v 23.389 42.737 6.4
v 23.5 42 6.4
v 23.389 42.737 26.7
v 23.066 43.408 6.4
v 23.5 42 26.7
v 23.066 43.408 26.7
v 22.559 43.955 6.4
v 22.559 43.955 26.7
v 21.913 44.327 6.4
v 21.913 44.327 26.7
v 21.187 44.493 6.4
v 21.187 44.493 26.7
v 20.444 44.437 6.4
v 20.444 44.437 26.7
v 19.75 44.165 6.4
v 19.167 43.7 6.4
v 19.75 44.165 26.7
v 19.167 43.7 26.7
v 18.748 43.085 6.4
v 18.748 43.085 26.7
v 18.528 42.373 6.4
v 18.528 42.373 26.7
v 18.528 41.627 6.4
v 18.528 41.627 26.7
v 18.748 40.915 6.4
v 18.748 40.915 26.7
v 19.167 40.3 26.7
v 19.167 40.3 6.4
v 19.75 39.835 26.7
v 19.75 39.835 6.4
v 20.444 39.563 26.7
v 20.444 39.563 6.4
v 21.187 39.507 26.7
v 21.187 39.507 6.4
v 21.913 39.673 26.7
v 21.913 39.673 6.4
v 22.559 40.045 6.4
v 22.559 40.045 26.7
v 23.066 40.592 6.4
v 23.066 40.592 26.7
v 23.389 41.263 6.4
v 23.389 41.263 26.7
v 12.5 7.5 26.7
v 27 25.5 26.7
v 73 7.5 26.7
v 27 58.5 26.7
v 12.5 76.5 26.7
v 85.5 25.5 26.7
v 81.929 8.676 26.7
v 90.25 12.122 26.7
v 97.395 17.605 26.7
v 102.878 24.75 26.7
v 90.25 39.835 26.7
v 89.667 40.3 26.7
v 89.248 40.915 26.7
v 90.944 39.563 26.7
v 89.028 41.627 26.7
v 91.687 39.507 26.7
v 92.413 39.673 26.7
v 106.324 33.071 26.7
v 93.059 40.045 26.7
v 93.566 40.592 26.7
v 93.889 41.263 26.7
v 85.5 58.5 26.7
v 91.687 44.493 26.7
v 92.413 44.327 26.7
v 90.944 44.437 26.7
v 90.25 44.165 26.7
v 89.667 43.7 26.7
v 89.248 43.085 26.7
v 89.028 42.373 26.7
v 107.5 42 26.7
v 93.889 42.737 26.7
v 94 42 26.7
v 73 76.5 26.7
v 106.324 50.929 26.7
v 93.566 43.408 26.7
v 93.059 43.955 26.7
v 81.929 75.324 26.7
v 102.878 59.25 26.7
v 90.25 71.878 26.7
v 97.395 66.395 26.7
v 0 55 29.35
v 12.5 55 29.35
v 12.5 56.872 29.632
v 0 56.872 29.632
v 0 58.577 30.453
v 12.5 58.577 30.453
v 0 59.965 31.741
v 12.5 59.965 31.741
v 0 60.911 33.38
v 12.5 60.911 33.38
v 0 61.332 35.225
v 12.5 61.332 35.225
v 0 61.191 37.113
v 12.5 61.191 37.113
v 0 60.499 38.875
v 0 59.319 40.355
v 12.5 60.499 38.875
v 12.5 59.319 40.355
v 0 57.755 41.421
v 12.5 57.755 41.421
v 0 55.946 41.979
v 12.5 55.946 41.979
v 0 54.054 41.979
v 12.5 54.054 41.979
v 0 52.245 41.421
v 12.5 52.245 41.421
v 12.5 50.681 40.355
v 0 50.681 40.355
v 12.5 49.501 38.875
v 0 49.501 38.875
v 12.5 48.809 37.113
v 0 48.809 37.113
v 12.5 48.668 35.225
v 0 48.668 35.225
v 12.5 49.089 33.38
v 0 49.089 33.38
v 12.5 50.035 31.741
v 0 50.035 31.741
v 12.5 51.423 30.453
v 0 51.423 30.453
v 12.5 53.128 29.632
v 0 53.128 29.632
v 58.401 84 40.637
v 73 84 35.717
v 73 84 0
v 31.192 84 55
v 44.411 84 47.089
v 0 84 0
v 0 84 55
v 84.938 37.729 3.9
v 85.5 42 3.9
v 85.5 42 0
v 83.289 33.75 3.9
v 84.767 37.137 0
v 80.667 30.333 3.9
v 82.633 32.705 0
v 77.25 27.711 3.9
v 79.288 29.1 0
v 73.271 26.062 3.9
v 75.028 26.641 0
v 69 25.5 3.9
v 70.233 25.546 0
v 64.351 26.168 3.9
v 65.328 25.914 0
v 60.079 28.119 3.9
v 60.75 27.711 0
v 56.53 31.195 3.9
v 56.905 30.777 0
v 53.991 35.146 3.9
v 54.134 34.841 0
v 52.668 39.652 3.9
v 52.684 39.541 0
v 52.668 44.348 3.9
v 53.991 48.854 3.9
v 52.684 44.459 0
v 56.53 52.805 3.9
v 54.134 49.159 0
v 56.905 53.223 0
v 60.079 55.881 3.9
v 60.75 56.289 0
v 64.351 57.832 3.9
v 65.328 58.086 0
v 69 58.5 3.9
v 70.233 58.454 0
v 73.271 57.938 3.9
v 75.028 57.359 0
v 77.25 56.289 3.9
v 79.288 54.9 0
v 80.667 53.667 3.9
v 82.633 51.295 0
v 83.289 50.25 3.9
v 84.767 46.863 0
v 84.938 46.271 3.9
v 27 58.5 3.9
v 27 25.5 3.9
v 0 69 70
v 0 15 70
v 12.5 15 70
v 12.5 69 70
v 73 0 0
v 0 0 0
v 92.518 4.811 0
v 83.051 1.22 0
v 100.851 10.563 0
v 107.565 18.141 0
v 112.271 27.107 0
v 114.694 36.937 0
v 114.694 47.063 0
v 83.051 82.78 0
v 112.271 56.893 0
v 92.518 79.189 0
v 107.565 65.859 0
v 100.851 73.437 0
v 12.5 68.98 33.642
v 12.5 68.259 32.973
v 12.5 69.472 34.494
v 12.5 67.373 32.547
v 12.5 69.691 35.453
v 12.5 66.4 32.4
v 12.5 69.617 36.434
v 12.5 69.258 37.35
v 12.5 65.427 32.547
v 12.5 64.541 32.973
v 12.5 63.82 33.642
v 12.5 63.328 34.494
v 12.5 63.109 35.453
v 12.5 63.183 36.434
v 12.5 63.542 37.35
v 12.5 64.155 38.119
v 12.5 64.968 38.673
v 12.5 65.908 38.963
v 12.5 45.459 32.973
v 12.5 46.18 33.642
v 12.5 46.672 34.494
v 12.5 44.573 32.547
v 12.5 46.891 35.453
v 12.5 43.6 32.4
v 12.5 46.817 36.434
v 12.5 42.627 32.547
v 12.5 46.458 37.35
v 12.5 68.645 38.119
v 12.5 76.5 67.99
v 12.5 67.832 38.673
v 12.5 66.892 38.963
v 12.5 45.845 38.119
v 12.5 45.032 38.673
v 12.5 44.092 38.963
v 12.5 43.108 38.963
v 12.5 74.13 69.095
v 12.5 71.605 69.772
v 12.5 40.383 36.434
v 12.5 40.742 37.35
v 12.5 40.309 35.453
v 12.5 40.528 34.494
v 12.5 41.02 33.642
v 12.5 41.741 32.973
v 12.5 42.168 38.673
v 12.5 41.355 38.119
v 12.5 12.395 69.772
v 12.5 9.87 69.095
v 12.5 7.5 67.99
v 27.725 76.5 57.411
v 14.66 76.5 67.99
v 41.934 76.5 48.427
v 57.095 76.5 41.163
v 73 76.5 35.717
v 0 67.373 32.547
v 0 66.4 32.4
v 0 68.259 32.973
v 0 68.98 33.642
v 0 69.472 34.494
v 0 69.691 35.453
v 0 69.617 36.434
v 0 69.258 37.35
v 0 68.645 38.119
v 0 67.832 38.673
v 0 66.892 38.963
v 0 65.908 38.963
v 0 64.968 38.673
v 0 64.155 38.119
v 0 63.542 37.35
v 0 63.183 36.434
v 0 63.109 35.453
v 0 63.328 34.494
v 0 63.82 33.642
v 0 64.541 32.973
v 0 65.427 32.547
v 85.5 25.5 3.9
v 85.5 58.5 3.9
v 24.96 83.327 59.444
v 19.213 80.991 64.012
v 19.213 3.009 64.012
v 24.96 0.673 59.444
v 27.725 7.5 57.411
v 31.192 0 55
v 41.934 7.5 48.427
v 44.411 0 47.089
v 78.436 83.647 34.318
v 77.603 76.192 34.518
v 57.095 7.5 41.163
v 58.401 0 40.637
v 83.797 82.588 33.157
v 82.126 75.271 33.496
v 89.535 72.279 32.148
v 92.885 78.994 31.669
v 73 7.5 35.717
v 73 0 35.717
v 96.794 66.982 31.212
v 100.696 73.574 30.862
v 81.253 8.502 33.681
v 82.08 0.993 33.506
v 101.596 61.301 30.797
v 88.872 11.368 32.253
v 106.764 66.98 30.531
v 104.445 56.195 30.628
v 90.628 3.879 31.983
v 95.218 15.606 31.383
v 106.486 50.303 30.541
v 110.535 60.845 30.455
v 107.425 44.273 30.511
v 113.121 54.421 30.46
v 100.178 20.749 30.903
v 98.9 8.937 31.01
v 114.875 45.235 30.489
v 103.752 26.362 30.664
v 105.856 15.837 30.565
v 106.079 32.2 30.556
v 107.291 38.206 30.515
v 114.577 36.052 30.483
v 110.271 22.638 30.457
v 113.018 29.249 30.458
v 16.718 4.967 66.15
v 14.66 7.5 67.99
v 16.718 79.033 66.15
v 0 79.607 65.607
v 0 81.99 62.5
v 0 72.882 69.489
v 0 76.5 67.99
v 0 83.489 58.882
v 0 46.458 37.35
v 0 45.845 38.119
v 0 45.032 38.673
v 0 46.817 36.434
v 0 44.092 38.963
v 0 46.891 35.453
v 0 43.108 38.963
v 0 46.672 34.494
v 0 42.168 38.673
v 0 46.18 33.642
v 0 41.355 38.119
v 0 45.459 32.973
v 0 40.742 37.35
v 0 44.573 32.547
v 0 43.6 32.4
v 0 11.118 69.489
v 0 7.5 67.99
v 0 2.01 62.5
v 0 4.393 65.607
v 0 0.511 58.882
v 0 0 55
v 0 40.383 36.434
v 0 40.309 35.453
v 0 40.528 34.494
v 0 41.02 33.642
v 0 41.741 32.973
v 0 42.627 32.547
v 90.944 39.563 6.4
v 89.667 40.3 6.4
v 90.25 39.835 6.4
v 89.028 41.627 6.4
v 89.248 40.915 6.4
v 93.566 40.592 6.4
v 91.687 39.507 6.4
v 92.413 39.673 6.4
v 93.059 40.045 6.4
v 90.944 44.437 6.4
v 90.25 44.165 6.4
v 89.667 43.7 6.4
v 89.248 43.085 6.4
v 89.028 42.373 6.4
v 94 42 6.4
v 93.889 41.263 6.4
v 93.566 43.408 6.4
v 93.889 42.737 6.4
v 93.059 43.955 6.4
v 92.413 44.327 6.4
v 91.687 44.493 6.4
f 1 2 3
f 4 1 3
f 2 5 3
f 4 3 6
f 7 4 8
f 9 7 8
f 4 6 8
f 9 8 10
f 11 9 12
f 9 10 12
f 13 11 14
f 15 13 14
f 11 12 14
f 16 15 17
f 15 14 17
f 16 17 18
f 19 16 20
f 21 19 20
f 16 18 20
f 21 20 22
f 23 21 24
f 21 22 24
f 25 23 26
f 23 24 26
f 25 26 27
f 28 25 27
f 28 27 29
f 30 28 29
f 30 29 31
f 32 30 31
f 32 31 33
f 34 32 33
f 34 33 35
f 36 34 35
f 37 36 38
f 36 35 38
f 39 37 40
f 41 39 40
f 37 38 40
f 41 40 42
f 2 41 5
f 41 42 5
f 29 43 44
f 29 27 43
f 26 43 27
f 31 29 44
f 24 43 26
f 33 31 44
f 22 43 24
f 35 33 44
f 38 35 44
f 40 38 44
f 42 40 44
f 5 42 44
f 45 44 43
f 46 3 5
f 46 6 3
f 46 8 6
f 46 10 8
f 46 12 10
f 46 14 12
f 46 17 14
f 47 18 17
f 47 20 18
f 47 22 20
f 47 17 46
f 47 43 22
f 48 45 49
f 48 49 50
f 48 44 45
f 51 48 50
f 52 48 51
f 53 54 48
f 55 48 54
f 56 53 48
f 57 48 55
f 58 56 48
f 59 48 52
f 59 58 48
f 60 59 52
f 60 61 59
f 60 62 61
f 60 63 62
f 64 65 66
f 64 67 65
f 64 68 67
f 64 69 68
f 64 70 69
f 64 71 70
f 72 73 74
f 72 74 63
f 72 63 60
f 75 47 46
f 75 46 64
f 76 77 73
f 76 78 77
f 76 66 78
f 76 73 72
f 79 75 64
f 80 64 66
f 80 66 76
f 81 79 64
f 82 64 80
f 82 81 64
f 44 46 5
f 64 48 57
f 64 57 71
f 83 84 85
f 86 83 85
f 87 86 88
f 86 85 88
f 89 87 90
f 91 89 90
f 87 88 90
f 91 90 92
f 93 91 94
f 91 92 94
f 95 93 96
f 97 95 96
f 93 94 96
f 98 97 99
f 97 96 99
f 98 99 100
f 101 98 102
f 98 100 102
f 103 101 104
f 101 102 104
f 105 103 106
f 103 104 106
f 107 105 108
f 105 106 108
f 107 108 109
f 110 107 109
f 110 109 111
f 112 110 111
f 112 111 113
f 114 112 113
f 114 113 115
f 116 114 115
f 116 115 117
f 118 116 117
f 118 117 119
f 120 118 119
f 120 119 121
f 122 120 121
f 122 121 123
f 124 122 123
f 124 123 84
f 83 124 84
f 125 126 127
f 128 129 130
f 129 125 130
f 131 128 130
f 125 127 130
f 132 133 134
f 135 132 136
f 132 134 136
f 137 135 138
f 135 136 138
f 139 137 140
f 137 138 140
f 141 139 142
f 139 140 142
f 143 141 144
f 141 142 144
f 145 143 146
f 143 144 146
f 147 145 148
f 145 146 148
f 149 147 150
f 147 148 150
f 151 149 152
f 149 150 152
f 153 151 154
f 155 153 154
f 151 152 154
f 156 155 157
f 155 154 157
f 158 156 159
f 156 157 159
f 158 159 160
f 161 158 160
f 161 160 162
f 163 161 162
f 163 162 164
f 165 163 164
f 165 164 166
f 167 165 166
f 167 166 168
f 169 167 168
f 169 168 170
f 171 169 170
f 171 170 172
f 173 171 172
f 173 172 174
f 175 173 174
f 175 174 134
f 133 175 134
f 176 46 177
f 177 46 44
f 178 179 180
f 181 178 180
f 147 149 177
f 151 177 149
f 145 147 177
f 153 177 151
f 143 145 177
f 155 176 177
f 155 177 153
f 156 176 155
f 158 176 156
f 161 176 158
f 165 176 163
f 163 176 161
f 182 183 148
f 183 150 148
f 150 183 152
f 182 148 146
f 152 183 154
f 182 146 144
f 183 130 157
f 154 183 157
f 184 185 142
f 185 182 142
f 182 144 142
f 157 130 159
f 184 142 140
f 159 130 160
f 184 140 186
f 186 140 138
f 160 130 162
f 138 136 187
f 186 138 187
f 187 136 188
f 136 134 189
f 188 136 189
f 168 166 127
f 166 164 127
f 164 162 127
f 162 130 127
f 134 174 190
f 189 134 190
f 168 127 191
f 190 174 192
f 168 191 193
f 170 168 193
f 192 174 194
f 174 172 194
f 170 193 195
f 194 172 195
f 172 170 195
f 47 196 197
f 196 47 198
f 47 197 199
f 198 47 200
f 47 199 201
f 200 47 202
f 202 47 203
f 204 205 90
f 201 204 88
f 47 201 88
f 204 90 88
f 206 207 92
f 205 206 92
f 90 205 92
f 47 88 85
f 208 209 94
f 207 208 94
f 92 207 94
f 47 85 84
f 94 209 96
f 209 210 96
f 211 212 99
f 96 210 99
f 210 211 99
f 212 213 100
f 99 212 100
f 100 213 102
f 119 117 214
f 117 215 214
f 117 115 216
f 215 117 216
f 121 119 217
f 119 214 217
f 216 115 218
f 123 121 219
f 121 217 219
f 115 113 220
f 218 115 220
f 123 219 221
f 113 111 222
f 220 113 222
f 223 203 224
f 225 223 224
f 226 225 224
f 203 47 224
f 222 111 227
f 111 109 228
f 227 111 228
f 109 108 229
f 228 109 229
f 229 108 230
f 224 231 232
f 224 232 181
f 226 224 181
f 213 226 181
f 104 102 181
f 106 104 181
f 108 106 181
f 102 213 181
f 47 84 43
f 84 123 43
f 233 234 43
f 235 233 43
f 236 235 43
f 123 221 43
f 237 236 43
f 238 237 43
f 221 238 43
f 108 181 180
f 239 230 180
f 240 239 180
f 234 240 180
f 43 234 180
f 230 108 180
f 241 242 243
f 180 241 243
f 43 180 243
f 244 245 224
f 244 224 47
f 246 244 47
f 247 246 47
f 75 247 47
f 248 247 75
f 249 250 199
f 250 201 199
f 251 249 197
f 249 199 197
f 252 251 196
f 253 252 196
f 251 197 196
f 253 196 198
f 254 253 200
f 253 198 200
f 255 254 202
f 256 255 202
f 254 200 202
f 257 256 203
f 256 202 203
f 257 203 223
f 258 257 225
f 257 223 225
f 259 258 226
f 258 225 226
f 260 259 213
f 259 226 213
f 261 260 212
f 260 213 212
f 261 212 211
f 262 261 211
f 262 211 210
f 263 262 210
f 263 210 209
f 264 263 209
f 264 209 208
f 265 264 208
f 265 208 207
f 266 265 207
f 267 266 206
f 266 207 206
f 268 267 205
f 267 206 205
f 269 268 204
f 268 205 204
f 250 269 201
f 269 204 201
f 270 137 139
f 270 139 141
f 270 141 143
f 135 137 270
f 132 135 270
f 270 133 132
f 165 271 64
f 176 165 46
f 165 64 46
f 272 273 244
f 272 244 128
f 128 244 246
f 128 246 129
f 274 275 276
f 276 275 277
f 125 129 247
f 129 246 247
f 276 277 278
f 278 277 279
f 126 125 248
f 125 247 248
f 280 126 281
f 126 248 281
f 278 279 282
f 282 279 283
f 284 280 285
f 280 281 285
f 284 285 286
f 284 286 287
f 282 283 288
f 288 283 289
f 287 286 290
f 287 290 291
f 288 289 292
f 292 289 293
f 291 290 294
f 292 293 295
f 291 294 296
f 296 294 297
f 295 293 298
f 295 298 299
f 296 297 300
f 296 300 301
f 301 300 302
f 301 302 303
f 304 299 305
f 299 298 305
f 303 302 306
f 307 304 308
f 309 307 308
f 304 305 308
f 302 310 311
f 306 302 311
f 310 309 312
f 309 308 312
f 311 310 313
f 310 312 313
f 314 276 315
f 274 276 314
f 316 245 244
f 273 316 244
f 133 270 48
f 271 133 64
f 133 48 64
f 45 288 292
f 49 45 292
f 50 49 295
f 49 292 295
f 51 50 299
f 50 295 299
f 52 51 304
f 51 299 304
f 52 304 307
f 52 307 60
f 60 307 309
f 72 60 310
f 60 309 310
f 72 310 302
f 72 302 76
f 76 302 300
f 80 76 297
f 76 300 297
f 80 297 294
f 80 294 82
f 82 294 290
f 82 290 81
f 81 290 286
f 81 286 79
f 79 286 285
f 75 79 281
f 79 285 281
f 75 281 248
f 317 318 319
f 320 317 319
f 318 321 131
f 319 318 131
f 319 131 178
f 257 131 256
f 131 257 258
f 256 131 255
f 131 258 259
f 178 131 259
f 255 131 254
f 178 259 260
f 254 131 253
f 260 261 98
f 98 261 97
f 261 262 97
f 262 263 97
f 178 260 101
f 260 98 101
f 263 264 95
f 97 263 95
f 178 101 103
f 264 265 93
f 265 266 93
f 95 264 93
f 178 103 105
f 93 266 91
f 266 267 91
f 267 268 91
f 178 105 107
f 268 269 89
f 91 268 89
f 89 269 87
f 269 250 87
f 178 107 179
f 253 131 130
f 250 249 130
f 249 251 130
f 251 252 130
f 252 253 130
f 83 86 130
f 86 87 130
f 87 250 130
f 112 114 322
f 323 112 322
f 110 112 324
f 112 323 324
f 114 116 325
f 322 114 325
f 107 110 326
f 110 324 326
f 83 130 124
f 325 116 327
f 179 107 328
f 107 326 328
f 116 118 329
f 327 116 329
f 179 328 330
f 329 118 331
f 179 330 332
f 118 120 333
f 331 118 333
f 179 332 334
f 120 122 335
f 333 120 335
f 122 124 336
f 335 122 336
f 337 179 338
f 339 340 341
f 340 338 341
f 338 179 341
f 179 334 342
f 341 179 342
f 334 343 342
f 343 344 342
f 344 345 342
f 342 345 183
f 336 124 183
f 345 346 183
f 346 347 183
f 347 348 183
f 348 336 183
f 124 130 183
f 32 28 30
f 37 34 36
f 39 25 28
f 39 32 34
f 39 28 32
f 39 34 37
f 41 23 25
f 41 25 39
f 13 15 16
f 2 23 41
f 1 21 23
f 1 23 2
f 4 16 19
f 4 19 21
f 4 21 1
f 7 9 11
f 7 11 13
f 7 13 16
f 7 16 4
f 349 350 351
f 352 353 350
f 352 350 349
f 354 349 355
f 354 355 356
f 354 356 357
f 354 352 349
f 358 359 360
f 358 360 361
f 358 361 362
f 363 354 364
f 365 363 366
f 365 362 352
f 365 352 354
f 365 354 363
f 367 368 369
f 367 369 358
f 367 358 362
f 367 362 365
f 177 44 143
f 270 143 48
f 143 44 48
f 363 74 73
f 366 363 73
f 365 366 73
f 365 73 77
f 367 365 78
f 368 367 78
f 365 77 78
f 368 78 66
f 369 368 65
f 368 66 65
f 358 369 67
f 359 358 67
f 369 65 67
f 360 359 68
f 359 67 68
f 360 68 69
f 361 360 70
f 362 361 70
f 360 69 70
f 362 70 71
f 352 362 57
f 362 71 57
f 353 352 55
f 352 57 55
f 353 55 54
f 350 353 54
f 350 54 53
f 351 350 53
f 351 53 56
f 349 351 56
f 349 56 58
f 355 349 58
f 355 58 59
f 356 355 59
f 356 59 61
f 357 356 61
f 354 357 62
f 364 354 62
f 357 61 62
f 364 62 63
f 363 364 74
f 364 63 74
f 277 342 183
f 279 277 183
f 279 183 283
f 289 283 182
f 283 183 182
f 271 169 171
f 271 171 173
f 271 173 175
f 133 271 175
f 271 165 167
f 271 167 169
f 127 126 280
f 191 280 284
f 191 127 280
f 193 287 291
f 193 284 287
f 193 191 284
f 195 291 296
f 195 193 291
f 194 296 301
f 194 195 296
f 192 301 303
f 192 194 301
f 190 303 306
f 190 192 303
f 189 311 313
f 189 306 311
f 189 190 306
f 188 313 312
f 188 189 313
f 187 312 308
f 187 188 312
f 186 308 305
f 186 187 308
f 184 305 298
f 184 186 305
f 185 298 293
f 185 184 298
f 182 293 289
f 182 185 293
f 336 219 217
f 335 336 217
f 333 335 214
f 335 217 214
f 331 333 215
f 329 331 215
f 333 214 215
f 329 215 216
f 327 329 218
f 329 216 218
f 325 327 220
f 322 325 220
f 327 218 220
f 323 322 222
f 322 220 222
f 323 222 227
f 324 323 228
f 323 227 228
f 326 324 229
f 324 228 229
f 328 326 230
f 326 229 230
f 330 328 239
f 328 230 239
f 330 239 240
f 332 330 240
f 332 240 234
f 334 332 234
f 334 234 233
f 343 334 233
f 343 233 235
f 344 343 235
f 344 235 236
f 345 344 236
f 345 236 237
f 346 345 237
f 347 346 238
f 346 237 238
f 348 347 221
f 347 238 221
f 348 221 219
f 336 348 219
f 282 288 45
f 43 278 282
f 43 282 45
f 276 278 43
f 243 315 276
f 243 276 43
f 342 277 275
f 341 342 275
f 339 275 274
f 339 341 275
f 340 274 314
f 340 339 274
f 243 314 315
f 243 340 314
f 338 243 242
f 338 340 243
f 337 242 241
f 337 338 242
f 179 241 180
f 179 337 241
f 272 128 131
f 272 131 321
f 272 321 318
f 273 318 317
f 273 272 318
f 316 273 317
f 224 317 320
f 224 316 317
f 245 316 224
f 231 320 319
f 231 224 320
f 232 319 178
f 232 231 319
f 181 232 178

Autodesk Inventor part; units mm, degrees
ref_plane "YZ Plane" through (0, 0, 0) normal (1, 0, 0) x (0, 1, 0)
ref_plane "XZ Plane" through (0, 0, 0) normal (0, 1, 0) x (-1, 0, 0)
ref_plane "XY Plane" through (0, 0, 0) normal (0, 0, 1) x (1, 0, 0)
sketch "Sketch1" plane through (0, 0, 0) normal (0, 0, 1) x (1, 0, 0)
  line L0 (0, 0) -> (115, 0)
  line L1 (115, 0) -> (115, 84)
  line L2 (115, 84) -> (0, 84)
  line L3 (0, 84) -> (0, 0)
  line L4 (115, 42) -> (0, 42) construction
  circle A0 centre (69, 42) radius 16.5
  arc A1 (73, 0) -> (73, 84) centre (73, 42) ccw
  dimension "d0" = 115
  dimension "d1" = 84
  dimension "d2" = 33
  dimension "d3" = 46
extrude "Extrusion1" add sketch "Sketch1" along normal blind 70 contours L3 L2 A1 L0
sketch "Sketch2" plane through (0, 0, 70) normal (0, 0, 1) x (1, 0, 0)
  arc A0 (73, 0) -> (73, 84) centre (73, 42) ccw projected
  line L0 (73, 84) -> (0, 84)
  line L1 (0, 84) -> (0, 0)
  line L2 (0, 0) -> (73, 0)
  arc A1 (73, 0) -> (73, 84) centre (73, 42) ccw
  line L3 (12.5, 76.5) -> (73, 76.5)
  arc A2 (73, 7.5) -> (73, 76.5) centre (73, 42) ccw
  line L4 (73, 7.5) -> (12.5, 7.5)
  line L5 (12.5, 76.5) -> (12.5, 7.5)
  dimension "d6" = 7.5
  dimension "d7" = 12.5
extrude "Extrusion2" cut sketch "Sketch2" against normal blind 43.3 contours L3 A2 L4 L5
sketch "Sketch3" plane through (0, 0, 0) normal (0, 1, 0) x (-1, 0, 0)
  line L0 (0, 0) -> (0, 70) construction
  line L1 (0, 30.5) -> (-115.317, 30.5) construction
  line L2 (-73, 0) -> (-115, 0) construction
  line L3 (-73, 0) -> (0, 0) construction
  line L4 (-12.5, 0) -> (-12.5, 70) construction
  line L5 (-107.817, 30.5) -> (-107.817, 0) construction
  arc A0 (-115.317, 30.5) -> (-12.5, 70) centre (-111.567, 174.3032) ccw
  line L6 (-12.5, 70) -> (-115.317, 70)
  line L7 (-115.317, 30.5) -> (-115.317, 70)
  dimension "d10" = 30.5
  dimension "d11" = 12.5
  dimension "d12" = 7.5
extrude "Extrusion3" cut sketch "Sketch3" along normal through all
fillet "Fillet1" radius 15 2 edges at (6.25, 0, 70) (6.25, 84, 70)
sketch "Sketch4" plane through (12.5, 7.5, 26.7) normal (1, 0, 0) x (0, 0, -1)
  line L0 (-9.0174, -7.5) -> (-28.3, -7.5) construction
  line L1 (-9, -7.5) -> (-9, 76.5) construction
  line L2 (26.7, 76.5) -> (-28.3, 76.5) construction
  line L3 (0, 0) -> (0, 69) construction
  circle A0 centre (-9, 47.5) radius 6.35
  circle A1 centre (-9, 58.9) radius 3.3
  circle A2 centre (-9, 36.1) radius 3.3
  point P0 (26.7, -7.5)
  dimension "d16" = 9
  dimension "d17" = 12.7
  dimension "d18" = 29
  dimension "d19" = 6.6
  dimension "d20" = 11.4
  dimension "d21" = 6.6
  dimension "d22" = 11.4
extrude "Extrusion4" cut sketch "Sketch4" against normal through all
sketch "Sketch5" plane through (0, 0, 26.7) normal (0, 0, 1) x (1, 0, 0)
  circle A0 centre (69, 42) radius 16.5 construction
  line L0 (85.5, 42) -> (85.5, 58.5) construction
  line L1 (69, 58.5) -> (85.5, 58.5) construction
  line L2 (85.5, 58.5) -> (27, 58.5)
  line L3 (27, 58.5) -> (27, 25.5)
  line L4 (27, 25.5) -> (85.5, 25.5)
  line L5 (85.5, 25.5) -> (85.5, 58.5)
  point P0 (0, 0)
  dimension "d25" = 58.5
extrude "Extrusion5" cut sketch "Sketch5" against normal blind 22.8
sketch "Sketch6" plane through (0, 0, 26.7) normal (0, 0, 1) x (1, 0, 0)
  line L0 (27, 25.5) -> (27, 58.5) construction
  line L1 (27, 42) -> (12.5, 42) construction
  line L2 (12.5, 46.9) -> (12.5, 40.3) construction
  circle A0 centre (21, 42) radius 2.5
  line L3 (85.5, 25.5) -> (27, 25.5) construction
  line L4 (56.25, 25.5) -> (56.25, 58.5) construction
  circle A1 centre (91.5, 42) radius 2.5
  point P0 (0, 0)
  dimension "d28" = 5
  dimension "d29" = 6
extrude "Extrusion6" cut sketch "Sketch6" against normal blind 20.3
properties part number "Final Arm 03"
